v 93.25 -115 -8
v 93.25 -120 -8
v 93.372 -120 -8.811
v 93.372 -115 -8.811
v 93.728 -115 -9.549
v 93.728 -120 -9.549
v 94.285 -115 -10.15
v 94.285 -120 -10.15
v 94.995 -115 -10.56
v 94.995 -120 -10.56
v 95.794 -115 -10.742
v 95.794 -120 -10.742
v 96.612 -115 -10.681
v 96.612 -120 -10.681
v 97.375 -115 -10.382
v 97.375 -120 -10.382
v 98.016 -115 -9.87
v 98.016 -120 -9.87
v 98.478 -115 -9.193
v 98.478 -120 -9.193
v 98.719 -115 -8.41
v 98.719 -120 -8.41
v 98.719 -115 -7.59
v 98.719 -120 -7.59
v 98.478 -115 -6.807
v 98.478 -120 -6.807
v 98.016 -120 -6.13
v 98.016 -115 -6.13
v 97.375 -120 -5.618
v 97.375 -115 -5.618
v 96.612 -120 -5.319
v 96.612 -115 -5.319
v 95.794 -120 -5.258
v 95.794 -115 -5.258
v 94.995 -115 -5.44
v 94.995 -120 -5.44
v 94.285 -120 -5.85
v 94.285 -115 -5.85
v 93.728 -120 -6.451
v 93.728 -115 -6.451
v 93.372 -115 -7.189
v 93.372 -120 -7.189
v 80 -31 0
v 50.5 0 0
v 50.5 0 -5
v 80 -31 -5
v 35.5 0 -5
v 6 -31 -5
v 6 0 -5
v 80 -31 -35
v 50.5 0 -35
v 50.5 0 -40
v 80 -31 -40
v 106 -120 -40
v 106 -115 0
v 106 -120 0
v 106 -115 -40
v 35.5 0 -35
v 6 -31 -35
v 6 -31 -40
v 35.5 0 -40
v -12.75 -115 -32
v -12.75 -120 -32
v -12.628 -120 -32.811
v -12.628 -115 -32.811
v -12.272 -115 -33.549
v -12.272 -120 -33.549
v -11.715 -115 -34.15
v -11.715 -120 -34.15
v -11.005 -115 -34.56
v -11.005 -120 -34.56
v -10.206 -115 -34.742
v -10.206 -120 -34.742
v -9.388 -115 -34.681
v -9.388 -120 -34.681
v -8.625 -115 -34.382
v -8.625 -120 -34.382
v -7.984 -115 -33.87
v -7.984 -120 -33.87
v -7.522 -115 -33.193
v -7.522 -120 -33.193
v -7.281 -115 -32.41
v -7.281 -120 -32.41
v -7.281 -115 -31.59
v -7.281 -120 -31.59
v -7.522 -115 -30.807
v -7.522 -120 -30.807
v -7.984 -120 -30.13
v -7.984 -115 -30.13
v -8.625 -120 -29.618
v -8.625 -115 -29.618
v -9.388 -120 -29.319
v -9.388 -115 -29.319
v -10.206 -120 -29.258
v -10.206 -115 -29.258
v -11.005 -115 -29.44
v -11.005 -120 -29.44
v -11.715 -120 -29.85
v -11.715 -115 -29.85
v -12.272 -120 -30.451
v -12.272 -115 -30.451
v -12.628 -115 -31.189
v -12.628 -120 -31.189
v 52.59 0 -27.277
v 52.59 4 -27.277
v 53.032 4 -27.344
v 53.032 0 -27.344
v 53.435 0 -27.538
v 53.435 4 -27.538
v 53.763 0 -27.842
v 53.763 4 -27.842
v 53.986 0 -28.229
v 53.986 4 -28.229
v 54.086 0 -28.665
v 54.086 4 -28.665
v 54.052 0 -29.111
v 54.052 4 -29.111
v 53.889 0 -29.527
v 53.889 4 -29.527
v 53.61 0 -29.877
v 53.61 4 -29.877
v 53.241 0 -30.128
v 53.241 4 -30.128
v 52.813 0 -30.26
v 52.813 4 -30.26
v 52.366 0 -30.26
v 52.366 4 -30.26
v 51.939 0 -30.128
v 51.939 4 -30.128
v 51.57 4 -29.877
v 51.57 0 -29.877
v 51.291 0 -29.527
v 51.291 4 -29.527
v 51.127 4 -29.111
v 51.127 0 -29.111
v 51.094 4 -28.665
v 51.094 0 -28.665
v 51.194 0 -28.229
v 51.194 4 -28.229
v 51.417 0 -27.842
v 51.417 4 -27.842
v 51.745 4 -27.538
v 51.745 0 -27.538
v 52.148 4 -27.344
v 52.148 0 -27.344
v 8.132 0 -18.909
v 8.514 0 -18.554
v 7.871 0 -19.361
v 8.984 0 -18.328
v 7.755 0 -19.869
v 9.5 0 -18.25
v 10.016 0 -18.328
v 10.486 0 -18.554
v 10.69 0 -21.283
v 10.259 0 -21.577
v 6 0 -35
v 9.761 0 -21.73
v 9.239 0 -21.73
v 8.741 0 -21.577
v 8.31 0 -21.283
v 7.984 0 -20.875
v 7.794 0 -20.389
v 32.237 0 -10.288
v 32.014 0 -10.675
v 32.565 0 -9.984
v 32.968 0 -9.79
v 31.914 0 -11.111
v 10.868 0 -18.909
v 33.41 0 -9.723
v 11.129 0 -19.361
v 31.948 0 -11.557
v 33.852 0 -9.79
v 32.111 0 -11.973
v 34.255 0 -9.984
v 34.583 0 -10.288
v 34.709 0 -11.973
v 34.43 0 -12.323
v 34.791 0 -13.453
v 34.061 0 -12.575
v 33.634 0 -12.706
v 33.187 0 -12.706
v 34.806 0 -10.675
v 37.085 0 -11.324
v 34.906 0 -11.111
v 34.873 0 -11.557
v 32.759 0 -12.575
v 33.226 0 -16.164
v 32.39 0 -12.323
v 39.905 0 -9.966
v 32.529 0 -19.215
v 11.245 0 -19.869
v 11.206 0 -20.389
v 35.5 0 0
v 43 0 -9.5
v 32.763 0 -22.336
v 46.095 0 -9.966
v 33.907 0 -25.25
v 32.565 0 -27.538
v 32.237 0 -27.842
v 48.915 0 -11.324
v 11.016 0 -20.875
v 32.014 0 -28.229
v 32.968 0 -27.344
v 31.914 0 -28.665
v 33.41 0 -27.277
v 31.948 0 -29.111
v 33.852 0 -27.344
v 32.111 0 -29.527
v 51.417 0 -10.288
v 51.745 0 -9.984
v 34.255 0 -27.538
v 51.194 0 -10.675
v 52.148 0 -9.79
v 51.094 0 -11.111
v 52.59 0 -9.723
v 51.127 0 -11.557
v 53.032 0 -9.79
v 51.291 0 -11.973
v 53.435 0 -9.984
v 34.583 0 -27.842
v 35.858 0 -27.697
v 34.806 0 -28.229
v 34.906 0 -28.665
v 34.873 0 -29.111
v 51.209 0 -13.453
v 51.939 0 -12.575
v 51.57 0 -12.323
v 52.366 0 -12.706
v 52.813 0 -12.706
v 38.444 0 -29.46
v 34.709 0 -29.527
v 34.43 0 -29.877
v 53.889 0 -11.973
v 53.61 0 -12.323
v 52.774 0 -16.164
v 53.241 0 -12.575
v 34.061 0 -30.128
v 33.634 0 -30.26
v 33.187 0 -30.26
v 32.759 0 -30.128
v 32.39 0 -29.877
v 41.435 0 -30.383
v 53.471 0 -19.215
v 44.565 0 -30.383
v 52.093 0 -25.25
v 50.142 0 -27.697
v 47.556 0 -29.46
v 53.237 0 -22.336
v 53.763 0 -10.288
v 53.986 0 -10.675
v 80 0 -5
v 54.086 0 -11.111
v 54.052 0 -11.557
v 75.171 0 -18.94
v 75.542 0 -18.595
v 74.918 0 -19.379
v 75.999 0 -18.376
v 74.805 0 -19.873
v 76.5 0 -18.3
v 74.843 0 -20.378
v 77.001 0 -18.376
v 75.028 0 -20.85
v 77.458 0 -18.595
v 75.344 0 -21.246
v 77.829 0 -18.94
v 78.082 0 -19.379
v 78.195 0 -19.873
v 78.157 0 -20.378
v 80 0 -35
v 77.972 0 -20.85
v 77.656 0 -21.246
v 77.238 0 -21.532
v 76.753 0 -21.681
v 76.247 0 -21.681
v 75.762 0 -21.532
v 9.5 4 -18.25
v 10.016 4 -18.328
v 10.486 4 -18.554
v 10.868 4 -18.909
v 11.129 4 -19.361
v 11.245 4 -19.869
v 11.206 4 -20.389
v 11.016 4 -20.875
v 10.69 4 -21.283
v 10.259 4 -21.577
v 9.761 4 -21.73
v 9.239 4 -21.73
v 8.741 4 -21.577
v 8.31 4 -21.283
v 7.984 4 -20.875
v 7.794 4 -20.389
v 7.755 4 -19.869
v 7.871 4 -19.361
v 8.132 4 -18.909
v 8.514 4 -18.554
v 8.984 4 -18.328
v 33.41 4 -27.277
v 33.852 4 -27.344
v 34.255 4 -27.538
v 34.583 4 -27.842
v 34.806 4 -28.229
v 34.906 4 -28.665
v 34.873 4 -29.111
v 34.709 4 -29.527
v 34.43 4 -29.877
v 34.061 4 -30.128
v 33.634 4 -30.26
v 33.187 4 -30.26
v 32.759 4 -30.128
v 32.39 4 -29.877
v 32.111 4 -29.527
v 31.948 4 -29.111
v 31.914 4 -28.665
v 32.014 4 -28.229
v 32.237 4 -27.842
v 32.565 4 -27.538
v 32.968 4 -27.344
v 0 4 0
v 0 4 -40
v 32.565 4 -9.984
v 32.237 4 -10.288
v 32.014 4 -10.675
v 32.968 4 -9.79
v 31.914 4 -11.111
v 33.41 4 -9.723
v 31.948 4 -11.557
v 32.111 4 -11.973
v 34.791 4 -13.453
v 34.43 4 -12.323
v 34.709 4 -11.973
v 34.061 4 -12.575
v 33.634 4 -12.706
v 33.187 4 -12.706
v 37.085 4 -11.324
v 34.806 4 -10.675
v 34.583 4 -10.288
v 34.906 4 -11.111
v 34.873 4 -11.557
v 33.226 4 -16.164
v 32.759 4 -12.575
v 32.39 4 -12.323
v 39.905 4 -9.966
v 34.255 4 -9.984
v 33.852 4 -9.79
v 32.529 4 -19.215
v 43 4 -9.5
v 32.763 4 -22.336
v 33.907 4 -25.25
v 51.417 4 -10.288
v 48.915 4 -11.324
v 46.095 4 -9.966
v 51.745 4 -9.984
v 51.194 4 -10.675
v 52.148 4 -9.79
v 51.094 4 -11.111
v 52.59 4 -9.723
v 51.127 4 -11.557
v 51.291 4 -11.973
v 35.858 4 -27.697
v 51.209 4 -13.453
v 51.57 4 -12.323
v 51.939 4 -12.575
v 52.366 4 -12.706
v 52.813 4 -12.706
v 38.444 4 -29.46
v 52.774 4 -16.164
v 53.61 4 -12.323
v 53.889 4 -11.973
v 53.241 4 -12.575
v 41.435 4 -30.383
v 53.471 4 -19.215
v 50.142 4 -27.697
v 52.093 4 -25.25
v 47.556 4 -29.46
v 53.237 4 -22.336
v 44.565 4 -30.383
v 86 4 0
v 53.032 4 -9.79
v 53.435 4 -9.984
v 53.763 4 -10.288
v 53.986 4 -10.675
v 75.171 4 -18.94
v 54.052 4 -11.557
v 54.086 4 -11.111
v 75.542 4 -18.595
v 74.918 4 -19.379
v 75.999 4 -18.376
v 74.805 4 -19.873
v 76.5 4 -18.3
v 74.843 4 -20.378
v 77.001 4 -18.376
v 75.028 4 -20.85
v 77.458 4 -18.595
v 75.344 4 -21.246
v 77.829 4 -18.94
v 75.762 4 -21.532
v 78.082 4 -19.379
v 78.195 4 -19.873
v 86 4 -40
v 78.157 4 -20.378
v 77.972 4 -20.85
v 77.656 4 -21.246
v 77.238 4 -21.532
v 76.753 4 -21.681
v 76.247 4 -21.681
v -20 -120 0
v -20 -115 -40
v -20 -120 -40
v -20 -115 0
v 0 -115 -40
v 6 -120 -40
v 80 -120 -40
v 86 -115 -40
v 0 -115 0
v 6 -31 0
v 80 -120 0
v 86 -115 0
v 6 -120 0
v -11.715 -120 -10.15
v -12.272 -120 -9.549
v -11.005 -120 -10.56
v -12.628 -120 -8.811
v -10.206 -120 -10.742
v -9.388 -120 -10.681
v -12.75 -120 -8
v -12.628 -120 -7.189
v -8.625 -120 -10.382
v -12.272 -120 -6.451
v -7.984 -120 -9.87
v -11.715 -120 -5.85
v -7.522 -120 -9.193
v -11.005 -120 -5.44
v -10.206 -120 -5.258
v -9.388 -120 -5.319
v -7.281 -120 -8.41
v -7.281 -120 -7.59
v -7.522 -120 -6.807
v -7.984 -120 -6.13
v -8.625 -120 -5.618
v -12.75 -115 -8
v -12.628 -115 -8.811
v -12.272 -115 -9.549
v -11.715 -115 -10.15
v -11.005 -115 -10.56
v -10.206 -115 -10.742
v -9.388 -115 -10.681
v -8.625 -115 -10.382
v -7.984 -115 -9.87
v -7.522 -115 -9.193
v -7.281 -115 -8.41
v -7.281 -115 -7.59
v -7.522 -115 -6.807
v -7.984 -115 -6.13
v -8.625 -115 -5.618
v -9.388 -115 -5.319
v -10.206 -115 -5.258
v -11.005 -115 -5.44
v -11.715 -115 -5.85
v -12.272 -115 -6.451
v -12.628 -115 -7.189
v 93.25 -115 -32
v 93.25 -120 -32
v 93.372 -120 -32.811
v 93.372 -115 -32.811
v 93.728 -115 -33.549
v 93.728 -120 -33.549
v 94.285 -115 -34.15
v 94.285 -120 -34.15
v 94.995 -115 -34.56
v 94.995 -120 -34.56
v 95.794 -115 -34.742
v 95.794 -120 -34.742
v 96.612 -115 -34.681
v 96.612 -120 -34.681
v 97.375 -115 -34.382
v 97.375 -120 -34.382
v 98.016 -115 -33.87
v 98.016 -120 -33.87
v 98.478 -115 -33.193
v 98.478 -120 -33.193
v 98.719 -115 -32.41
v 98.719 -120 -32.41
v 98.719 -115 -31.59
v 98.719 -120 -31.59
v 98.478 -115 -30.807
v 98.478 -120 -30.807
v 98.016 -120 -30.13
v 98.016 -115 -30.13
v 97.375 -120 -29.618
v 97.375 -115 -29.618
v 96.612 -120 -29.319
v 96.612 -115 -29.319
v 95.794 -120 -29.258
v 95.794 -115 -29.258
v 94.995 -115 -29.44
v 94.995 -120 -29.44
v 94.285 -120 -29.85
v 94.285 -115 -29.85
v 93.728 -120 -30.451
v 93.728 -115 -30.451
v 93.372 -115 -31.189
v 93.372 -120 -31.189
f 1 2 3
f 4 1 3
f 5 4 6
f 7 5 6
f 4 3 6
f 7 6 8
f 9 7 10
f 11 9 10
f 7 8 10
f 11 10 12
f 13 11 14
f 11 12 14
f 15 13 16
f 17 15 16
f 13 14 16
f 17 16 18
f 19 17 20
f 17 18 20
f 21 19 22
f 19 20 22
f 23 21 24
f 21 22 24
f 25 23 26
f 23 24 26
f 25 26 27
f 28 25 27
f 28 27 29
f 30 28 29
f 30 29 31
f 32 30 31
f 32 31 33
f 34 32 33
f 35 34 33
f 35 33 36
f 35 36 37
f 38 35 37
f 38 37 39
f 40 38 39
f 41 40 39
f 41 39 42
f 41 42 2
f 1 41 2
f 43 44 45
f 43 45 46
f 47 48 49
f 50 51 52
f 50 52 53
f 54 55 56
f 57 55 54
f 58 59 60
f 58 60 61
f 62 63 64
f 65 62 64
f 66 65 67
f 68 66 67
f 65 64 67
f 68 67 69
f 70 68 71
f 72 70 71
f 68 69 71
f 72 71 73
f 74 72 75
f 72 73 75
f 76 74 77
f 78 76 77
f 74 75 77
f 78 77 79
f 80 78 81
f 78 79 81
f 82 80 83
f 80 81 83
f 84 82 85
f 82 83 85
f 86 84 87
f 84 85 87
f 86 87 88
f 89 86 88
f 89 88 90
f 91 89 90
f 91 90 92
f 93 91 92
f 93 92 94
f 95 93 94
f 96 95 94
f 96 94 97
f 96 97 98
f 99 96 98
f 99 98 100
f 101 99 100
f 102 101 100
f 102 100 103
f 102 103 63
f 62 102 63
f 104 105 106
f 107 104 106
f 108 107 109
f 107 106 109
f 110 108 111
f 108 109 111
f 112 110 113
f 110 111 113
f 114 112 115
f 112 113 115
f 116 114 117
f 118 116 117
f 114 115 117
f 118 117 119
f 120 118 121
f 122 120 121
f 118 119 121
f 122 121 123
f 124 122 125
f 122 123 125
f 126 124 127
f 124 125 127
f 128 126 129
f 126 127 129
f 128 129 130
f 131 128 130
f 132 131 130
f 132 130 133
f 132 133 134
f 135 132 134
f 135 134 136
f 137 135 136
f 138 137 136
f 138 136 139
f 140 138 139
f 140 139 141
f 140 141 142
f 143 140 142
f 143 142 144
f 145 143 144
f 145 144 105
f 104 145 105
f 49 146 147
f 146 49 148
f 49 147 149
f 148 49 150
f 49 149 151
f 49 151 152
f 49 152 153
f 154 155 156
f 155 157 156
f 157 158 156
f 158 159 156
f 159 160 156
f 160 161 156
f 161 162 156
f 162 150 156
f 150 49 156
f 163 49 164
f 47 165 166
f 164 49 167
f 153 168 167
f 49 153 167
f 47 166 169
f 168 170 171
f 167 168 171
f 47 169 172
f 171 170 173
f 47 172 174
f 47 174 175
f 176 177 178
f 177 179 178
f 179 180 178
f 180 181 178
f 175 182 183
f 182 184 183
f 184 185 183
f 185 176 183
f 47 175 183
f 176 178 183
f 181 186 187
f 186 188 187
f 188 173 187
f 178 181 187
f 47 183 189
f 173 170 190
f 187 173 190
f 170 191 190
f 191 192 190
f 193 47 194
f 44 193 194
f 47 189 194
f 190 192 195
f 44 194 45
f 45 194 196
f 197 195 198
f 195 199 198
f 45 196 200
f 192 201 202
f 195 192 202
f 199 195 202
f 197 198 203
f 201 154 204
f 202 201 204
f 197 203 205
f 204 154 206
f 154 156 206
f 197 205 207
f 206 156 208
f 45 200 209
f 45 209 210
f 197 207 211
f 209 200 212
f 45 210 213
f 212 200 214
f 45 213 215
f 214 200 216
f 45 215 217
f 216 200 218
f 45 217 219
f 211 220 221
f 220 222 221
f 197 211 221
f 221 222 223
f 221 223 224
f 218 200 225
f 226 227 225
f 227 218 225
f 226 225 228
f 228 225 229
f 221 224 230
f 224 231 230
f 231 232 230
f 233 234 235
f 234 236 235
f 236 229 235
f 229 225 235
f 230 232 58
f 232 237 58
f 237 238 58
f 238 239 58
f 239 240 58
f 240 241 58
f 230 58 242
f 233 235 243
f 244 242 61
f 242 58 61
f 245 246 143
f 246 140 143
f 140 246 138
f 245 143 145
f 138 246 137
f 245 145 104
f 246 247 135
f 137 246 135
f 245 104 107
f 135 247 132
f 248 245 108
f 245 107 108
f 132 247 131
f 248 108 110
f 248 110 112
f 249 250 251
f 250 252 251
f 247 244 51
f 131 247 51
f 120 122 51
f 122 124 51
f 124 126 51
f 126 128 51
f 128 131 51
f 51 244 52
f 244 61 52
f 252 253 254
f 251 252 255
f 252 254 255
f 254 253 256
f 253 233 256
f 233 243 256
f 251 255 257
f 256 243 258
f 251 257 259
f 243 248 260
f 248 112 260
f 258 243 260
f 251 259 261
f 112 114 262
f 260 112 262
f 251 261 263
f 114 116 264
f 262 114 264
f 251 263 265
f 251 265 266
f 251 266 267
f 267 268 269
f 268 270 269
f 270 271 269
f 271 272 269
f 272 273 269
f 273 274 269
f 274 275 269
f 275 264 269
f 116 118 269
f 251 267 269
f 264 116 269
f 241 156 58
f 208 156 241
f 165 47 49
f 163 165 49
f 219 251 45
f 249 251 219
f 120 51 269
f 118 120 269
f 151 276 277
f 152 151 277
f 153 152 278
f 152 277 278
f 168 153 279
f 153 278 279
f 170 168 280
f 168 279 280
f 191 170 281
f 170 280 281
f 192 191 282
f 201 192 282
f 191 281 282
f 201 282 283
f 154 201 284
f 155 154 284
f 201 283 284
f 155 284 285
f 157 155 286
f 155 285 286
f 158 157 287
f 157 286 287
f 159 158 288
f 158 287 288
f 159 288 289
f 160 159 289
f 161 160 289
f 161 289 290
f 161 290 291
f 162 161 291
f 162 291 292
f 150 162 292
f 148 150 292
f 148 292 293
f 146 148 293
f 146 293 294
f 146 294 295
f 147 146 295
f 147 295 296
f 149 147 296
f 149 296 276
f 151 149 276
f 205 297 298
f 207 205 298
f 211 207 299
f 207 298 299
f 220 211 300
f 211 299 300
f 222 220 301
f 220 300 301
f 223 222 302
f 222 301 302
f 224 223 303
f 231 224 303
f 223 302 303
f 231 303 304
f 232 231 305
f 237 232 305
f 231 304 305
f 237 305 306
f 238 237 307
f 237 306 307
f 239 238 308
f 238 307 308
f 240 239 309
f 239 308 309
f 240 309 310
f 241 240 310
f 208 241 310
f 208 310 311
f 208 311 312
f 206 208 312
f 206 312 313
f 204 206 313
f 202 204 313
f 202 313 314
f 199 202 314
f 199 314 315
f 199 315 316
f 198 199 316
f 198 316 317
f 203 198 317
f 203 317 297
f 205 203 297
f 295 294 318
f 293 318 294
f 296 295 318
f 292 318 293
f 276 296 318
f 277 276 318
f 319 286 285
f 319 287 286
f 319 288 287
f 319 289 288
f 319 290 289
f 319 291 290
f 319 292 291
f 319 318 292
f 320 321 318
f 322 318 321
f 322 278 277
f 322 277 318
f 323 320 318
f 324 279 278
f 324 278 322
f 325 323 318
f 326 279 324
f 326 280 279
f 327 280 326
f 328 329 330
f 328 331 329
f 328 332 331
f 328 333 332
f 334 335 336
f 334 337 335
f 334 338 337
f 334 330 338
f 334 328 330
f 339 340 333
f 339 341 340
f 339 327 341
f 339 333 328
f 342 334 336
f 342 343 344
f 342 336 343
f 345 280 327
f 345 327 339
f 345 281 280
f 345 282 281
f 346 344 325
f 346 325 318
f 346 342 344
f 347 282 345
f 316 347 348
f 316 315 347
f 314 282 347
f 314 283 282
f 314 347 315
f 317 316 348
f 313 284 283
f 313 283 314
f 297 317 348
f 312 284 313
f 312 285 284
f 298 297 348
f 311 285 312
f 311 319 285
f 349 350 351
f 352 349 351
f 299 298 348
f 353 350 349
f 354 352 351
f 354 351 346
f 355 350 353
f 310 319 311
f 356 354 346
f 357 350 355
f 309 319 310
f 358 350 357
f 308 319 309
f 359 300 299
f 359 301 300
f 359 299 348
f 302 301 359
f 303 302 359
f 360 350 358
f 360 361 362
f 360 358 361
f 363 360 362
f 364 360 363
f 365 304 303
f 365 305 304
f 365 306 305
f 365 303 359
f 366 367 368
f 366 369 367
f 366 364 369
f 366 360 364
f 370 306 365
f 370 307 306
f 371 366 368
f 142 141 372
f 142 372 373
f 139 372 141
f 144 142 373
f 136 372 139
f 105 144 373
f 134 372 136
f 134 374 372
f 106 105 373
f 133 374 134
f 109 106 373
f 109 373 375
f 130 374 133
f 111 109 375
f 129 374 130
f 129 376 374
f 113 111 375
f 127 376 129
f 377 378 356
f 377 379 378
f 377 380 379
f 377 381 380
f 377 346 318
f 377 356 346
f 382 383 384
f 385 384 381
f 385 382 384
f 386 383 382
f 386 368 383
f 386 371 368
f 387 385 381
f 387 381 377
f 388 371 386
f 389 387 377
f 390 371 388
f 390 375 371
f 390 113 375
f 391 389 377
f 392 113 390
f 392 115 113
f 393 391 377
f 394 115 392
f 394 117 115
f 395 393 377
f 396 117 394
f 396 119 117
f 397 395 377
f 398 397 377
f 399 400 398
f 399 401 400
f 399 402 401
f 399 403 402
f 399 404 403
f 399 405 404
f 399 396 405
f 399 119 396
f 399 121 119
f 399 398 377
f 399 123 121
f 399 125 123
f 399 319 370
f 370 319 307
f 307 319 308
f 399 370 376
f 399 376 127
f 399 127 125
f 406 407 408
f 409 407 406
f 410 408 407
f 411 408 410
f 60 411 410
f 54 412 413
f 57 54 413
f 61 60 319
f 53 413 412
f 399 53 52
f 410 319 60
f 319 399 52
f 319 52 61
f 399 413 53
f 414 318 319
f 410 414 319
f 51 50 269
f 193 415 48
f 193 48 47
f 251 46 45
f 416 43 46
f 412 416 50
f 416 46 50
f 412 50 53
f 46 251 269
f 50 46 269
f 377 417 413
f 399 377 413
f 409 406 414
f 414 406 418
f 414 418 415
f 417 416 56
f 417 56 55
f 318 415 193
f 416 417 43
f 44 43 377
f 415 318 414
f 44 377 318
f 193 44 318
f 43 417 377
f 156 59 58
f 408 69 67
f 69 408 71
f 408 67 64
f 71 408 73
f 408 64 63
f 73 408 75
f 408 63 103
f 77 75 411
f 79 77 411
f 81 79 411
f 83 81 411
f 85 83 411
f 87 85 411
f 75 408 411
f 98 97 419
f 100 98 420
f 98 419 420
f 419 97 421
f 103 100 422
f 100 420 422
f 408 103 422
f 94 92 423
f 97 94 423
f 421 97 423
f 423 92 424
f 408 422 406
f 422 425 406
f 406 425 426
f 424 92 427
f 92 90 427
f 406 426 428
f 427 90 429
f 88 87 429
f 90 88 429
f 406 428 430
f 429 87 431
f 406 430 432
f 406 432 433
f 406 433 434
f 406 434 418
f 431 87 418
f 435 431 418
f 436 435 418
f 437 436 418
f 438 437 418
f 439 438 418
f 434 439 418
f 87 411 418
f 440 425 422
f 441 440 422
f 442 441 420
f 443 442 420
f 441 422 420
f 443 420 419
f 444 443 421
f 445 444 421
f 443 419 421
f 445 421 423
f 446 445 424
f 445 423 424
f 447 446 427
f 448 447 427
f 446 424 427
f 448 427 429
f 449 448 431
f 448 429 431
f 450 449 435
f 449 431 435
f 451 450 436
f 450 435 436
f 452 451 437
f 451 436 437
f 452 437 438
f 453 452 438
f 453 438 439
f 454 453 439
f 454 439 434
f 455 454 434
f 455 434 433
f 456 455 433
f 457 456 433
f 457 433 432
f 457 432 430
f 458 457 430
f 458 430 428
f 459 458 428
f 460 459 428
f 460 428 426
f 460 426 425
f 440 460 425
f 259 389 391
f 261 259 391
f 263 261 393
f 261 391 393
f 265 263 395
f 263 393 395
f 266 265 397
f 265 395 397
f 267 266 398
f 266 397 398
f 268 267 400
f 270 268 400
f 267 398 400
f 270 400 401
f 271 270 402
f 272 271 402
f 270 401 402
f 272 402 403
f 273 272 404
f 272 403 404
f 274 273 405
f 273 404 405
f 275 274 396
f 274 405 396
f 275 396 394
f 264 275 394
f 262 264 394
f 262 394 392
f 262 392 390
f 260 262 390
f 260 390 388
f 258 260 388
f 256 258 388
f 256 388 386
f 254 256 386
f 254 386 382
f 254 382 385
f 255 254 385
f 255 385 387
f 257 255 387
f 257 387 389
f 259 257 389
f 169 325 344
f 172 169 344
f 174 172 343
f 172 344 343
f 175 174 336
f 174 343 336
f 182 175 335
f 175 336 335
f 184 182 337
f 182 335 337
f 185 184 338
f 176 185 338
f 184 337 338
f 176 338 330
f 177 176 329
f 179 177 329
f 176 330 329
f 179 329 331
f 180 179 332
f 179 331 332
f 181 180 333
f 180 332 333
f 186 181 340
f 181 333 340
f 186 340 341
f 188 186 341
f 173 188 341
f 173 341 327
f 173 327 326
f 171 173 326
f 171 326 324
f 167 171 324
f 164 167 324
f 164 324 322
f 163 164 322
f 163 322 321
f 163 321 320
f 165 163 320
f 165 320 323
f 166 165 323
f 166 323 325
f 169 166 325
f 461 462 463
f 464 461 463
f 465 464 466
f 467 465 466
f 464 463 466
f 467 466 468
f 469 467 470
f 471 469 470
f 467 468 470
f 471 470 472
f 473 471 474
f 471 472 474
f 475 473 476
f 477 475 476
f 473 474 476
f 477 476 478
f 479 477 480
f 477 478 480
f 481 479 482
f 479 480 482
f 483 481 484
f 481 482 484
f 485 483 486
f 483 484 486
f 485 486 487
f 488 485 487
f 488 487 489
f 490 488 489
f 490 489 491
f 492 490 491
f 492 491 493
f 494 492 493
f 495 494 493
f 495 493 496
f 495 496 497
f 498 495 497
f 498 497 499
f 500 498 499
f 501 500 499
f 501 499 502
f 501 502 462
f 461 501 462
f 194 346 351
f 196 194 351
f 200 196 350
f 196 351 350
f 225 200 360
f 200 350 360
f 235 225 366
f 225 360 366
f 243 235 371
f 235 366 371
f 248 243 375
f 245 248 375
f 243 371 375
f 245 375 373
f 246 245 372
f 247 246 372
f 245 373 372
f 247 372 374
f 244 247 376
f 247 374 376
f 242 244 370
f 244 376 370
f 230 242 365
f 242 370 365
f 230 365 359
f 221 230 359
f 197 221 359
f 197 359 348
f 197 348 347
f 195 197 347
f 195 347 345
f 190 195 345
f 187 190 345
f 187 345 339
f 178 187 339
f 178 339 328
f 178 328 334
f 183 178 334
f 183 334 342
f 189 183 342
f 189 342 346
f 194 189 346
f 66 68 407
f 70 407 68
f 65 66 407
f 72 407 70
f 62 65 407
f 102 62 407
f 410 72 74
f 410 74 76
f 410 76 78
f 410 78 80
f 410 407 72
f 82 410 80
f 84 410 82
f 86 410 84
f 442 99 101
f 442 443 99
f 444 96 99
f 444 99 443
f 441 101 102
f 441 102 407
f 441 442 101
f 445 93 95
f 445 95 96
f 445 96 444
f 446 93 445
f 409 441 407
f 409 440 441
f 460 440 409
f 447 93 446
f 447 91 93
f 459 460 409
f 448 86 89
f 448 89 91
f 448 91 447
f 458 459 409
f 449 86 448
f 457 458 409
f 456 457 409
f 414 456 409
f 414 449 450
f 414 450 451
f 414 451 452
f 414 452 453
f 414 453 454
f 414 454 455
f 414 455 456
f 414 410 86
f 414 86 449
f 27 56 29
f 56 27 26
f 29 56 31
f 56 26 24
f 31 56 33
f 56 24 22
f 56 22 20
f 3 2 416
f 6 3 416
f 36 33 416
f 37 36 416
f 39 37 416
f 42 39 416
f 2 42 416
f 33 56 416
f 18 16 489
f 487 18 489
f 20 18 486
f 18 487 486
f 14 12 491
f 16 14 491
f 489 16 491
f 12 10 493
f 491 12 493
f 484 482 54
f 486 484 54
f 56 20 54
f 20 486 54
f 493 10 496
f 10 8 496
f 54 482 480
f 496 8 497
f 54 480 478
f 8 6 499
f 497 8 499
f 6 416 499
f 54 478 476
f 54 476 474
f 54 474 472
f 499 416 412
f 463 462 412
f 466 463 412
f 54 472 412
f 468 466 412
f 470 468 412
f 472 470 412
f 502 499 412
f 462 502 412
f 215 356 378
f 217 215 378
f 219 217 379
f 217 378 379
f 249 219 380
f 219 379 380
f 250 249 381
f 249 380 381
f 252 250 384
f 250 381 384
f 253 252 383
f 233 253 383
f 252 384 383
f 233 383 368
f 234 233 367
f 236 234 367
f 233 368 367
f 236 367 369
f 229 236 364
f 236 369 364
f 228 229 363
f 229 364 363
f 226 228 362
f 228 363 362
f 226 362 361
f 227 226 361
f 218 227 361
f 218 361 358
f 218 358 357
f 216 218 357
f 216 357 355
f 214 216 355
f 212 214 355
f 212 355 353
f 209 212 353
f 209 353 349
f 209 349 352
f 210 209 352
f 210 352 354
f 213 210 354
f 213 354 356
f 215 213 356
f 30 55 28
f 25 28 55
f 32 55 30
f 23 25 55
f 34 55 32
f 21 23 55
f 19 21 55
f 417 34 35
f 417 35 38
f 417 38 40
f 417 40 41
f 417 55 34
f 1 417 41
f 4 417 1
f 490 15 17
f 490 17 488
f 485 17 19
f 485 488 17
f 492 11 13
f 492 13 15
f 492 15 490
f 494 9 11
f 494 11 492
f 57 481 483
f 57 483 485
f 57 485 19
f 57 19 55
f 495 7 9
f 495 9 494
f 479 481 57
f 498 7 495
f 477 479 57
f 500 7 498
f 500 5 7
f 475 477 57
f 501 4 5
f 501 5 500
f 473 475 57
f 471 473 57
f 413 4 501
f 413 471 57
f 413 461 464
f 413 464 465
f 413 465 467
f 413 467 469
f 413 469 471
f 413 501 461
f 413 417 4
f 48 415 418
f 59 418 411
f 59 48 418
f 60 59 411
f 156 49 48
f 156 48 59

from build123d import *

# Parameters (mm, degrees)
ESQUISSE1_W              = 86
ESQUISSE1_H              = 40
BOSS_EXTRU_1_DEPTH       = 4
ESQUISSE2_R              = 10.5
ENL_V_MAT_EXTRU_1_DEPTH  = 95.93155429
ESQUISSE3_W              = 6
ESQUISSE3_H              = 40
BOSS_EXTRU_2_DEPTH       = 120
ESQUISSE4_W              = 40
ESQUISSE4_H              = 5
BOSS_EXTRU_3_DEPTH       = 20
ESQUISSE5_W              = 40
ESQUISSE5_H              = 5
BOSS_EXTRU_4_DEPTH       = 20
D_GAGEMENT_M51_D         = 5.5
ESQUISSE32_W             = 40
ESQUISSE32_H             = 31
BOSS_EXTRU_5_DEPTH       = 29.5
ESQUISSE33_W             = 40
ESQUISSE33_H             = 31
BOSS_EXTRU_6_DEPTH       = 29.5
ESQUISSE39_R             = 1.5
ENL_V_MAT_EXTRU_4_DEPTH  = 168.964281917
ESQUISSE43_W             = 30
ESQUISSE43_H             = 31
ENL_V_MAT_EXTRU_12_DEPTH = 29.5
ESQUISSE44_W             = 30
ESQUISSE44_H             = 31
ENL_V_MAT_EXTRU_13_DEPTH = 29.5
ENL_V_MAT_EXTRU_14_DEPTH = 166.033329967
ESQUISSE47_R             = 1.75
ESQUISSE47_R_2           = 1.7
ENL_V_MAT_EXTRU_15_DEPTH = 168.964281917


with BuildPart() as part:
    # Esquisse1 → Boss.-Extru.1 (new body)
    with BuildSketch(Plane(origin=(0, 0, 0), x_dir=(1, 0, 0), z_dir=(0, 1, 0))):
        with Locations((43, 20)):
            Rectangle(ESQUISSE1_W, ESQUISSE1_H)
    extrude(amount=BOSS_EXTRU_1_DEPTH)

    # Esquisse2 → Enlèv. mat.-Extru.1 (cut, through all)
    with BuildSketch(Plane(origin=(0, 4, 0), x_dir=(1, 0, 0), z_dir=(0, 1, 0))):
        with Locations(Location((43, 20, 0), (0, 0, 270))):
            Circle(ESQUISSE2_R)
    extrude(amount=-ENL_V_MAT_EXTRU_1_DEPTH, mode=Mode.SUBTRACT)

    # Esquisse3 → Boss.-Extru.2 (add)
    with BuildSketch(Plane(origin=(0, 0, 0), x_dir=(-1, 0, 0), z_dir=(0, -1, 0))):
        with Locations((-3, 20)):
            Rectangle(ESQUISSE3_W, ESQUISSE3_H)
        with Locations((-83, 20)):
            Rectangle(ESQUISSE3_W, ESQUISSE3_H)
    extrude(amount=BOSS_EXTRU_2_DEPTH)

    # Esquisse4 → Boss.-Extru.3 (add)
    with BuildSketch(Plane.ZY):
        with Locations((-20, -117.5)):
            Rectangle(ESQUISSE4_W, ESQUISSE4_H)
    extrude(amount=BOSS_EXTRU_3_DEPTH)

    # Esquisse5 → Boss.-Extru.4 (add)
    with BuildSketch(Plane(origin=(86, 0, 0), x_dir=(0, 0, -1), z_dir=(1, 0, 0))):
        with Locations((20, -117.5)):
            Rectangle(ESQUISSE5_W, ESQUISSE5_H)
    extrude(amount=BOSS_EXTRU_4_DEPTH)

    # Dégagement M51 (through all)
    with Locations(Plane(origin=(0, -115, 0), x_dir=(1, 0, 0), z_dir=(0, 1, 0))):
        with Locations((-10, 32), (-10, 8), (96, 32), (96, 8)):
            Hole(D_GAGEMENT_M51_D / 2)

    # Esquisse32 → Boss.-Extru.5 (add)
    with BuildSketch(Plane(origin=(6, 0, 0), x_dir=(0, 0, -1), z_dir=(1, 0, 0))):
        with Locations((20, -15.5)):
            Rectangle(ESQUISSE32_W, ESQUISSE32_H)
    extrude(amount=BOSS_EXTRU_5_DEPTH)

    # Esquisse33 → Boss.-Extru.6 (add)
    with BuildSketch(Plane.ZY.offset(-80)):
        with Locations((-20, -15.5)):
            Rectangle(ESQUISSE33_W, ESQUISSE33_H)
    extrude(amount=BOSS_EXTRU_6_DEPTH)

    # Esquisse39 → Enlèv. mat.-Extru.4 (cut, through all)
    with BuildSketch(Plane(origin=(0, 4, 0), x_dir=(1, 0, 0), z_dir=(0, 1, 0))):
        with Locations(Location((33.410152006, 28.776947958, 0), (0, 0, 270))):
            Circle(ESQUISSE39_R)
        with Locations(Location((33.410152006, 11.223052042, 0), (0, 0, 270))):
            Circle(ESQUISSE39_R)
        with Locations(Location((52.589847994, 11.223052042, 0), (0, 0, 270))):
            Circle(ESQUISSE39_R)
        with Locations(Location((52.589847994, 28.776947958, 0), (0, 0, 270))):
            Circle(ESQUISSE39_R)
    extrude(amount=-ENL_V_MAT_EXTRU_4_DEPTH, mode=Mode.SUBTRACT)

    # Esquisse43 → Enlèv. mat.-Extru.12 (cut)
    with BuildSketch(Plane(origin=(35.5, 0, 0), x_dir=(0, 0, -1), z_dir=(1, 0, 0))):
        with Locations((20, -15.5)):
            Rectangle(ESQUISSE43_W, ESQUISSE43_H)
    extrude(amount=-ENL_V_MAT_EXTRU_12_DEPTH, mode=Mode.SUBTRACT)

    # Esquisse44 → Enlèv. mat.-Extru.13 (cut)
    with BuildSketch(Plane.ZY.offset(-50.5)):
        with Locations((-20, -15.5)):
            Rectangle(ESQUISSE44_W, ESQUISSE44_H)
    extrude(amount=-ENL_V_MAT_EXTRU_13_DEPTH, mode=Mode.SUBTRACT)

    # Esquisse34 → Enlèv. mat.-Extru.14 (cut, through all)
    with BuildSketch(Plane.XY):
        Polygon((6, -31), (35.5, 0), (35.5, -31), align=None)
        Polygon((50.5, 0), (80, -31), (50.5, -31), align=None)
    extrude(amount=-ENL_V_MAT_EXTRU_14_DEPTH, mode=Mode.SUBTRACT)

    # Esquisse47 → Enlèv. mat.-Extru.15 (cut, through all)
    with BuildSketch(Plane(origin=(0, 4, 0), x_dir=(1, 0, 0), z_dir=(0, 1, 0))):
        with Locations(Location((9.5, 20, 0), (0, 0, 270))):
            Circle(ESQUISSE47_R)
        with Locations(Location((76.5, 20, 0), (0, 0, 270))):
            Circle(ESQUISSE47_R_2)
    extrude(amount=-ENL_V_MAT_EXTRU_15_DEPTH, mode=Mode.SUBTRACT)


solid = part.part
